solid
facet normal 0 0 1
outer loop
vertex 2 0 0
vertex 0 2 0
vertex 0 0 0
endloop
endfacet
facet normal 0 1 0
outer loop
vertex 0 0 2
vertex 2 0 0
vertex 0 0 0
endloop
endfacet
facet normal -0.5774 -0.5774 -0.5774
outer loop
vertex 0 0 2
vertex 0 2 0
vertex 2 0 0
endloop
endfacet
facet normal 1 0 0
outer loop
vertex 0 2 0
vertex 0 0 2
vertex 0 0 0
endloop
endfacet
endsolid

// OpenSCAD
// The deprecated `triangles=` spelling of `faces=`.
polyhedron(
  points = [[0,0,0],[2,0,0],[0,2,0],[0,0,2]],
  triangles = [[0,2,1],[0,1,3],[1,2,3],[0,3,2]]);
